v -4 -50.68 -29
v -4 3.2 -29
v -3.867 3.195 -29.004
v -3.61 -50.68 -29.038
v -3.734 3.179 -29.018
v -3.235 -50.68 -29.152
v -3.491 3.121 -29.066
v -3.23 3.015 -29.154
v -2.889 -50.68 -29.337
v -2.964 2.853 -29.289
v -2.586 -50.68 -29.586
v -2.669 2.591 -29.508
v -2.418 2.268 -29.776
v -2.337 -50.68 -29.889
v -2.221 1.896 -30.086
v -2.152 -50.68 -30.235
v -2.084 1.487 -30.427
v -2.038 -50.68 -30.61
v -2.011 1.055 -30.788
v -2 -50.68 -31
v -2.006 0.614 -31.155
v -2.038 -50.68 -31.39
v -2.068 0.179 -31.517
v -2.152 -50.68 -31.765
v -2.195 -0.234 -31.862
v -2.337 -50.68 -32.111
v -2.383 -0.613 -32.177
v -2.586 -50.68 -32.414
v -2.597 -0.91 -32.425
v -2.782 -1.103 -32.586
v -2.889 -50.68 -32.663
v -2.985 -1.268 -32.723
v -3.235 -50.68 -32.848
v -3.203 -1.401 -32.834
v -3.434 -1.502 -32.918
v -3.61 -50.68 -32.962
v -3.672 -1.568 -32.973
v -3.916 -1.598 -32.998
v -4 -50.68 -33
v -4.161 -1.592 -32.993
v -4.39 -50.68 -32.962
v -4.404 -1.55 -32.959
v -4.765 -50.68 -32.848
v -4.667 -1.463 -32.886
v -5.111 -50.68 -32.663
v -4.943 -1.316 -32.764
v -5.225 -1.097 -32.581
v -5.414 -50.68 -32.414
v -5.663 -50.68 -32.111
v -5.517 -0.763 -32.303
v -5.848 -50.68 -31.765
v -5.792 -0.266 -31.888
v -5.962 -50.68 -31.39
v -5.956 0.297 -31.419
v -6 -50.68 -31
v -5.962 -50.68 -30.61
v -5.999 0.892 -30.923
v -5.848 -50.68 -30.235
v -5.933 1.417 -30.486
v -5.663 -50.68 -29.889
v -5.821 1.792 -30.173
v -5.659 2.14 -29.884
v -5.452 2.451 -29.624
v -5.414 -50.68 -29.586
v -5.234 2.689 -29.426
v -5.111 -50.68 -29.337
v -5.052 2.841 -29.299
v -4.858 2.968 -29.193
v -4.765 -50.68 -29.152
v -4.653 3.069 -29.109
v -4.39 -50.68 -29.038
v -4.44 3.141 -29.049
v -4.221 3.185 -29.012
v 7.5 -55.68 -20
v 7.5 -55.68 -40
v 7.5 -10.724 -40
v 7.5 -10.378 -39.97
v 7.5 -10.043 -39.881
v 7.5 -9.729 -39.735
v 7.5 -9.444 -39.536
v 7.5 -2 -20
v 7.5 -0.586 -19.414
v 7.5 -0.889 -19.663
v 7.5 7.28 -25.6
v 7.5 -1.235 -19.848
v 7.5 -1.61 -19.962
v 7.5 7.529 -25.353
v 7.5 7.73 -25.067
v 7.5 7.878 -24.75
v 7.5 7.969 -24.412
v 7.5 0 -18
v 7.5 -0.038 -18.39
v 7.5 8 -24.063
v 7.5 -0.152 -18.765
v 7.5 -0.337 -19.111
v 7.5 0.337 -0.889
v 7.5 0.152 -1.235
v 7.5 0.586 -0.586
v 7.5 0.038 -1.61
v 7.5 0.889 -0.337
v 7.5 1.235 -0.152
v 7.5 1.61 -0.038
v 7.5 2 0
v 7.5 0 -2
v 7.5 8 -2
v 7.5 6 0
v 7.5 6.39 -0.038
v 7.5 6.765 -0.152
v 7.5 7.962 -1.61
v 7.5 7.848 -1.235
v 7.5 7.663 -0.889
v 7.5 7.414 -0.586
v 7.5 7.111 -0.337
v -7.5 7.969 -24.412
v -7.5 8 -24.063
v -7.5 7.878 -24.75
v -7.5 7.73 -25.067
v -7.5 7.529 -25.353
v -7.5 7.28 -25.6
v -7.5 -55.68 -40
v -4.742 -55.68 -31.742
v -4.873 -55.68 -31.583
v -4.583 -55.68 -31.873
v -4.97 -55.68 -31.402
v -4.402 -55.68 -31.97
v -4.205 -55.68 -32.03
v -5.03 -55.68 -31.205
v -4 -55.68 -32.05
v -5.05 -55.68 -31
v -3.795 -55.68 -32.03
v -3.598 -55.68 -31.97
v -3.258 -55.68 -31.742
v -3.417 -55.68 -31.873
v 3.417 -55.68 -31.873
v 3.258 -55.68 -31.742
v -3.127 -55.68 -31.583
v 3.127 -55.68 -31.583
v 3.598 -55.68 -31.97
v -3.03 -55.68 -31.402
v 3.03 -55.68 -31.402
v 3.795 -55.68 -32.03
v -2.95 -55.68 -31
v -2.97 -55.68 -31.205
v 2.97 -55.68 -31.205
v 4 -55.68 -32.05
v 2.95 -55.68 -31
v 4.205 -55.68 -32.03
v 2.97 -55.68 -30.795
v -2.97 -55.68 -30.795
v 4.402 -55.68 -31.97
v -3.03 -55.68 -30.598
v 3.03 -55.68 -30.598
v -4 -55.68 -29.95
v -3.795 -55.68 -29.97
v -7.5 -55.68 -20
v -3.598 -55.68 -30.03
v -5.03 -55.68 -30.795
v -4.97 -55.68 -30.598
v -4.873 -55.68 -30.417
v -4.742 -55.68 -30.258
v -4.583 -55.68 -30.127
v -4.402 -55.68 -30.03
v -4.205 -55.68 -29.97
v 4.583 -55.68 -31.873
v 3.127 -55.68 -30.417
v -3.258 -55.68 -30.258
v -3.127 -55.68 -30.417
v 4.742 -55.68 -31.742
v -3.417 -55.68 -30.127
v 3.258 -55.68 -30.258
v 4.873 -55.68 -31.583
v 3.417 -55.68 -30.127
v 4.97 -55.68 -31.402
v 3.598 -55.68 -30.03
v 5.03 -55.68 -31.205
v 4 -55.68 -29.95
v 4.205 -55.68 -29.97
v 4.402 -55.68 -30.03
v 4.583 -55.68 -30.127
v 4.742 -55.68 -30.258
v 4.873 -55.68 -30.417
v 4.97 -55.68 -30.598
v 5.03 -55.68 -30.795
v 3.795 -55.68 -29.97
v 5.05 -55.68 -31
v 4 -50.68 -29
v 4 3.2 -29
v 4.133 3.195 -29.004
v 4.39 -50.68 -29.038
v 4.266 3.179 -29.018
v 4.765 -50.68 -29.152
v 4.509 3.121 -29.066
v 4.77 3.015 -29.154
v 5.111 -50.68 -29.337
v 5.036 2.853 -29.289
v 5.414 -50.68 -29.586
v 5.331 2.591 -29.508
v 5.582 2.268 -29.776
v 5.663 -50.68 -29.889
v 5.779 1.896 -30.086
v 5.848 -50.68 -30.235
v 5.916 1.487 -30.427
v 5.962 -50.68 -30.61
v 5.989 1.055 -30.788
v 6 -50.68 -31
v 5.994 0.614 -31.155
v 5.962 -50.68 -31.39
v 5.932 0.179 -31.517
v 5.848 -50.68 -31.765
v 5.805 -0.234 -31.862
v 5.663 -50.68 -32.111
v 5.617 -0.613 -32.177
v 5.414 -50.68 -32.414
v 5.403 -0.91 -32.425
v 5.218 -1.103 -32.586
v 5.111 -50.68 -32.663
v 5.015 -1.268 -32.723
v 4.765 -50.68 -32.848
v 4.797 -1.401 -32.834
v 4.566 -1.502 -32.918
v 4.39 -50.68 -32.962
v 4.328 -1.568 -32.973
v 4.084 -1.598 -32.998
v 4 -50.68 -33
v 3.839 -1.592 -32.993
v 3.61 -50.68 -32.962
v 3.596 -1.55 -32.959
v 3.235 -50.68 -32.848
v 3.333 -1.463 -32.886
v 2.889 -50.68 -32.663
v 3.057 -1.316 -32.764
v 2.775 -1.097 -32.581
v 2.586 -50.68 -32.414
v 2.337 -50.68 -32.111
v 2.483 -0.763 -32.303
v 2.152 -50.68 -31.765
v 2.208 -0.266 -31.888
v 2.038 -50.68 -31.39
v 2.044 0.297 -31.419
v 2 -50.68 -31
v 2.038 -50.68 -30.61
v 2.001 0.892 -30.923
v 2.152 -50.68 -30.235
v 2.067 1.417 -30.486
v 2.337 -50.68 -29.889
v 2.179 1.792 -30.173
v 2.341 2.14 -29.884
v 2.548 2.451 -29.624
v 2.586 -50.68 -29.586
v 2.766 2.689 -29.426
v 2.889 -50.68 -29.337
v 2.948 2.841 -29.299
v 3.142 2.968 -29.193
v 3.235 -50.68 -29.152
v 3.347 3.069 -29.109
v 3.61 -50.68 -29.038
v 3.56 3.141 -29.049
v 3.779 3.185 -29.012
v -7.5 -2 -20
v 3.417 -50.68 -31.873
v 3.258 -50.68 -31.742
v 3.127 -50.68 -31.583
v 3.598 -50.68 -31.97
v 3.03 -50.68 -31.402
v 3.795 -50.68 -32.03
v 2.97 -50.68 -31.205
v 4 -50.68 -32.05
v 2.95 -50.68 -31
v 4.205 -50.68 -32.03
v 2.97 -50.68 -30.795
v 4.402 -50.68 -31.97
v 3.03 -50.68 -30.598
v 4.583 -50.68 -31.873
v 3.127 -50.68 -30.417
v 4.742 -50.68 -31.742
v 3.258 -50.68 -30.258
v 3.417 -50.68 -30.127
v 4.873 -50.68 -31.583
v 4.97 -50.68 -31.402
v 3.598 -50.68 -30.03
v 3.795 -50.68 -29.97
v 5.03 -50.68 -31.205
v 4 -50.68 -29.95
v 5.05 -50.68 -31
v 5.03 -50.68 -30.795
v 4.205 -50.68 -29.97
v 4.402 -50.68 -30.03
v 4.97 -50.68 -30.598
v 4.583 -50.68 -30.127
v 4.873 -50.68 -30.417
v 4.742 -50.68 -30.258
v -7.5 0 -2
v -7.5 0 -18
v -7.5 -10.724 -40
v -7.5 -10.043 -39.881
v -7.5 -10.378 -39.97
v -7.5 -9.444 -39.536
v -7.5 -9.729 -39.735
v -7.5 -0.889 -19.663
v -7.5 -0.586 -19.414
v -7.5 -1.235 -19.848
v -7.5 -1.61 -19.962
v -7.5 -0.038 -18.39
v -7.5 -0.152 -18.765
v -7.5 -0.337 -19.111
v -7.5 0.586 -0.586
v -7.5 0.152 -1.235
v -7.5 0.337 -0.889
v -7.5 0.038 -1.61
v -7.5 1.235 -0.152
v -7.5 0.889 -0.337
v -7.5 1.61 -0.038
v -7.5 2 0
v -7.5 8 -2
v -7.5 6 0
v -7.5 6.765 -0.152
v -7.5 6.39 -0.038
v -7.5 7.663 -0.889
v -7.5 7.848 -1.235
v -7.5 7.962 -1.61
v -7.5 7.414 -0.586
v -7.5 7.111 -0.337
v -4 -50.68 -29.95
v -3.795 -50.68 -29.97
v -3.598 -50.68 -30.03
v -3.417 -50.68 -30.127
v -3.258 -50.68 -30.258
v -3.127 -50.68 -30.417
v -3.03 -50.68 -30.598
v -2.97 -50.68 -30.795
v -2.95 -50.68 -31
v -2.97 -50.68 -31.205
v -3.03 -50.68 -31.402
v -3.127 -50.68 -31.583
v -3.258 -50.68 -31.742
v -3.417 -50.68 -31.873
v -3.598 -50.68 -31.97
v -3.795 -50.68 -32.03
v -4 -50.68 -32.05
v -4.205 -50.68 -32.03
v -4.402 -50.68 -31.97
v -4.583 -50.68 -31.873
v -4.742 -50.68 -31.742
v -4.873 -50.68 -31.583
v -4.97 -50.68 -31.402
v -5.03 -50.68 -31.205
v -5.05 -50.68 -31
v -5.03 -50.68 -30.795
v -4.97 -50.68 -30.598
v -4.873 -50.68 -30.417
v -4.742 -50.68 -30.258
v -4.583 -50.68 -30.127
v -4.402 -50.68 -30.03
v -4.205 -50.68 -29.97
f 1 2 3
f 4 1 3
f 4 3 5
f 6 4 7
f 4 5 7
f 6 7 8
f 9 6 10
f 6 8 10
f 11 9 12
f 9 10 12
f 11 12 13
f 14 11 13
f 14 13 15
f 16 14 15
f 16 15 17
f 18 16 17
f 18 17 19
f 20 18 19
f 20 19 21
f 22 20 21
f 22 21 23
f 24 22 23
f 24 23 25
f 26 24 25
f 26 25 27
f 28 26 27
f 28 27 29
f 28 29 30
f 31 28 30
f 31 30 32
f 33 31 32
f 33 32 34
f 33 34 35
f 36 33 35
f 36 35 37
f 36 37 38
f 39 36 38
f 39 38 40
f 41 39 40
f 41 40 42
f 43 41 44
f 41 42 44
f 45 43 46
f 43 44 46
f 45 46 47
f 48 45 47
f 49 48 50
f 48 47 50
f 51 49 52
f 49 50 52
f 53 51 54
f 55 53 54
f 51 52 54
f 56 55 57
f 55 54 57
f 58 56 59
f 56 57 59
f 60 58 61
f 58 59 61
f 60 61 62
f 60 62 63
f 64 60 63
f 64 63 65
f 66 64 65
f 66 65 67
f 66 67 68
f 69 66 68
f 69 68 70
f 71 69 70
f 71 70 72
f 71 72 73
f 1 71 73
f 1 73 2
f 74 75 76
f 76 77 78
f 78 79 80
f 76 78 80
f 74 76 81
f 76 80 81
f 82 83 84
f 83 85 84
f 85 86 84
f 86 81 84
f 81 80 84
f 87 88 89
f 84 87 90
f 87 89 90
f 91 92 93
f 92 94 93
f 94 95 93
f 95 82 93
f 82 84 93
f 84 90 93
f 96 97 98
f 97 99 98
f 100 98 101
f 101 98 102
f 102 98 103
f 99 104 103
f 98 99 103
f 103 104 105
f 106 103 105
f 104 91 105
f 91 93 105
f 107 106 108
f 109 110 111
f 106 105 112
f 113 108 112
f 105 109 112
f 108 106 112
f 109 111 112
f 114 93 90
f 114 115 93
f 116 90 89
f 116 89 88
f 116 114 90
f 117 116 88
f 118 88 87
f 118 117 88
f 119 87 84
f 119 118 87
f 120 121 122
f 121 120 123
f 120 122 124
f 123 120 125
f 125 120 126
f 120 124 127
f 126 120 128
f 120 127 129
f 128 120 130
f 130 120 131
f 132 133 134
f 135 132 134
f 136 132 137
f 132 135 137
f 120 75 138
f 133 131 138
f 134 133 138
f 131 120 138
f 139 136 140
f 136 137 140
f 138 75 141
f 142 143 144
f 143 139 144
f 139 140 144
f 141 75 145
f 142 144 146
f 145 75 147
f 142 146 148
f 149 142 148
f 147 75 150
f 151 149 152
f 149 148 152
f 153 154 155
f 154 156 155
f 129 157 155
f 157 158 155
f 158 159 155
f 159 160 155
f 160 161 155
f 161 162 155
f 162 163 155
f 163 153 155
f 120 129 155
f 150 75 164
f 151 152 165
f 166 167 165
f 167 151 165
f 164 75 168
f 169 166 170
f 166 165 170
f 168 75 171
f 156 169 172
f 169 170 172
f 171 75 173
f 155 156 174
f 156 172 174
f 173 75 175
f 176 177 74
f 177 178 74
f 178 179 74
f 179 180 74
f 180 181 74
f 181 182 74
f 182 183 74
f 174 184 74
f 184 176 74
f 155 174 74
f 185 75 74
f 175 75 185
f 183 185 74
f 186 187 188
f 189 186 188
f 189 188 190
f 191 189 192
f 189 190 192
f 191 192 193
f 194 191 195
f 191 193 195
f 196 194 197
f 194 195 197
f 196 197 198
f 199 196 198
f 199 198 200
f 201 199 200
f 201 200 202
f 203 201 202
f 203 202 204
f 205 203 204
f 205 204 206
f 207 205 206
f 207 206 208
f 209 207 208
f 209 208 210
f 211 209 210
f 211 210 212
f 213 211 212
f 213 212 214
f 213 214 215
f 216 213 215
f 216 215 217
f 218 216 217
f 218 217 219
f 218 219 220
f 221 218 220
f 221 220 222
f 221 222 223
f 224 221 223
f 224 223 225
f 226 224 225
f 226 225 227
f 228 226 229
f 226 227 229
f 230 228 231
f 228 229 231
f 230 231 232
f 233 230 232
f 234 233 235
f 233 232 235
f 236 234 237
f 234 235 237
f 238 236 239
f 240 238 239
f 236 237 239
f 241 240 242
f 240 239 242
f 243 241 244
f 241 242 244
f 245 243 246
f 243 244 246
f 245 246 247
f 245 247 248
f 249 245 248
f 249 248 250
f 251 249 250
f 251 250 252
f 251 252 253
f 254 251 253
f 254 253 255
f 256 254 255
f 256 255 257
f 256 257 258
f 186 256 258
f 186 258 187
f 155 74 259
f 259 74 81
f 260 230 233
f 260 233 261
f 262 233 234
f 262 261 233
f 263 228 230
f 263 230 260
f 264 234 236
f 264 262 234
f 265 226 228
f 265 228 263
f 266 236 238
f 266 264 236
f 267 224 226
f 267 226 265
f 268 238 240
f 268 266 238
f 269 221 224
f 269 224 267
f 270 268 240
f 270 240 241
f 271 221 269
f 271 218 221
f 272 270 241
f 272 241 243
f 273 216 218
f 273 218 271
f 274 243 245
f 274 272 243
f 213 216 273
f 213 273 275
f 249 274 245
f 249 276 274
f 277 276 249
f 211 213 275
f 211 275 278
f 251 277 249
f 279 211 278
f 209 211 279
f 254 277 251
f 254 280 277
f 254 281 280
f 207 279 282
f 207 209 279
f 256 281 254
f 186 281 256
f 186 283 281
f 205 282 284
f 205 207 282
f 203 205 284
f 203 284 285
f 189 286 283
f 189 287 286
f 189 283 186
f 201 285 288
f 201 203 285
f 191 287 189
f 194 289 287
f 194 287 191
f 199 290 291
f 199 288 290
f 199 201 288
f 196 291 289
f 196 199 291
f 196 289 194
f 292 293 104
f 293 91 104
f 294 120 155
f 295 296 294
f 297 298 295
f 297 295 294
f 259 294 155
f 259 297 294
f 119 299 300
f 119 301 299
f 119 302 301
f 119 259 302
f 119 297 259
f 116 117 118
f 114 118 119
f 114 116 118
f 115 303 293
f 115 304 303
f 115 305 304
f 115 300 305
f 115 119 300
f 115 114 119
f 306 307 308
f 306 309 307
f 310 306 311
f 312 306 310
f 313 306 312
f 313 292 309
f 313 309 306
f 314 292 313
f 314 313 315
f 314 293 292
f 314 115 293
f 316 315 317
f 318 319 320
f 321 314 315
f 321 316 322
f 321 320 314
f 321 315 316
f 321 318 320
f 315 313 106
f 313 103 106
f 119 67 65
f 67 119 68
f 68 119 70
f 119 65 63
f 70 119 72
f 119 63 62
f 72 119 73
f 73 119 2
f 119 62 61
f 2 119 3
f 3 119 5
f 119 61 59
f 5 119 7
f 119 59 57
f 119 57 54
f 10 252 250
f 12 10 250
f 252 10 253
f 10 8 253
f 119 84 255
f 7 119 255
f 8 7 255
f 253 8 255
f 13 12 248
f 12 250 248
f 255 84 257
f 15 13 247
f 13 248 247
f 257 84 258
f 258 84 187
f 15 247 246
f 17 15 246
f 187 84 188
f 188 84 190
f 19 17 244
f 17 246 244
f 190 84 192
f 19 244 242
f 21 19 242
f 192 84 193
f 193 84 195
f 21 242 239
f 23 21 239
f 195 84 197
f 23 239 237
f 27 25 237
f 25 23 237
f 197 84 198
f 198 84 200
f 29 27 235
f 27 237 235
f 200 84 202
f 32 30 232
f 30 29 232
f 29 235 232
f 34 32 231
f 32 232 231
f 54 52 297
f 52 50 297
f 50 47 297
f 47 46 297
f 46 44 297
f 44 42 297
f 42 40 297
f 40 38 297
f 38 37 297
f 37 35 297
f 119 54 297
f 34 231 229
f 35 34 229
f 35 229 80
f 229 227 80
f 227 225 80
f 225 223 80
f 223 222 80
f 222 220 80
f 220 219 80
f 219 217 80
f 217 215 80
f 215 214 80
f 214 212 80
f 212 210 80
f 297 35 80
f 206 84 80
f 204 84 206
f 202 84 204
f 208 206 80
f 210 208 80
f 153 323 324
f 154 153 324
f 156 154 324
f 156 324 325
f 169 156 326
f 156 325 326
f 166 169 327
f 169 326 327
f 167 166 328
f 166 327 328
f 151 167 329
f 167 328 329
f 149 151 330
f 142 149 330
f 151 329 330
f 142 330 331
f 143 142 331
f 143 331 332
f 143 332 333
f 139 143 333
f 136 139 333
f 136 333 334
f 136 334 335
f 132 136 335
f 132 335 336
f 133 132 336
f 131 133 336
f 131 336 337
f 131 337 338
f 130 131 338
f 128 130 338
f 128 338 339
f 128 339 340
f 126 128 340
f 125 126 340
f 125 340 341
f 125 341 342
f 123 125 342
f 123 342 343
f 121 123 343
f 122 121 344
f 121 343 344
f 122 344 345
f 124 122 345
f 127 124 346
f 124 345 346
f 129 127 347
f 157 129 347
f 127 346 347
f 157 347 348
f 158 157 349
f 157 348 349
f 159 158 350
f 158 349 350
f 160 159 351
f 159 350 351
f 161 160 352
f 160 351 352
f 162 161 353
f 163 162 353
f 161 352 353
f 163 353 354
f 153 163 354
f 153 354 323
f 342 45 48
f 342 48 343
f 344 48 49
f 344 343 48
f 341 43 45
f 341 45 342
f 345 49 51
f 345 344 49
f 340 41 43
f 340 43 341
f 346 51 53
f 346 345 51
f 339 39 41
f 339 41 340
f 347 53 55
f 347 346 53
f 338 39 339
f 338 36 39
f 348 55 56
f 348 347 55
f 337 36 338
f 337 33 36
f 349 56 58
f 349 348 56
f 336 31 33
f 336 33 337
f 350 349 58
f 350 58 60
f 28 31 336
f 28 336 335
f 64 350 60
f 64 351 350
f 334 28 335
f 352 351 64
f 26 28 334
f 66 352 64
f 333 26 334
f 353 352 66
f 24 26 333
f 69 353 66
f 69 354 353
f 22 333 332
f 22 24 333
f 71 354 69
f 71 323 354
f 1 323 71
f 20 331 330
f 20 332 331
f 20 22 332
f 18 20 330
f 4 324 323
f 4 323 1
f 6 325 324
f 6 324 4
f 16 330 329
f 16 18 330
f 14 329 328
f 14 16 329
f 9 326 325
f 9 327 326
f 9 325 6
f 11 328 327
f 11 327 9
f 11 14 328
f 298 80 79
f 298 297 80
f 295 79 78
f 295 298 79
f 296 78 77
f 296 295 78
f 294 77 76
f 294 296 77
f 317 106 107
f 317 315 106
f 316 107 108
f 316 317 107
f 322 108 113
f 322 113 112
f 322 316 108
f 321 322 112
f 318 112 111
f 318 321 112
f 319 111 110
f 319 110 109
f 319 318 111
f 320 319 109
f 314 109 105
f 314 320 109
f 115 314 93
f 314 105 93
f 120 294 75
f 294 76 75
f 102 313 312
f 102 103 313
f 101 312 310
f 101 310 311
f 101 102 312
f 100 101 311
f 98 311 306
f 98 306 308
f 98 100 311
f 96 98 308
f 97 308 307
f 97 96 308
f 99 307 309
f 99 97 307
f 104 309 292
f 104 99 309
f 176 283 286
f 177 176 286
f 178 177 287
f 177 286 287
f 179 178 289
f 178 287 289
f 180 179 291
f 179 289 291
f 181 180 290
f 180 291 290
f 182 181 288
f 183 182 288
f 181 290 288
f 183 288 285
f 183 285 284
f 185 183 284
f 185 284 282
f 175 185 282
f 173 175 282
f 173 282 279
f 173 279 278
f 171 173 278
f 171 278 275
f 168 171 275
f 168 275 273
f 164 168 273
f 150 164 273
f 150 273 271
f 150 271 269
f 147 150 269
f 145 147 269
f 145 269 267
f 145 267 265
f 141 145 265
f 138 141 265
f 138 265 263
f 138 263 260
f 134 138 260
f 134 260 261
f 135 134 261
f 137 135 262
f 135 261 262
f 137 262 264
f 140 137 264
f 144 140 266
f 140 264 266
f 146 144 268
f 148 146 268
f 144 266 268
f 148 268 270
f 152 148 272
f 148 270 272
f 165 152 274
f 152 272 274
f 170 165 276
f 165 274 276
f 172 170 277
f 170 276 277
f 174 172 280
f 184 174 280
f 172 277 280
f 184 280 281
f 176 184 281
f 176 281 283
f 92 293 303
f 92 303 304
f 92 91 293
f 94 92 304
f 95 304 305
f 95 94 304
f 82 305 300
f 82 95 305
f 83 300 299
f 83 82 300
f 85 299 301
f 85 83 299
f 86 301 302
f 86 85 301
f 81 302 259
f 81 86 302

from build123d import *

# Parameters (mm, degrees)
BOSS_EXTRUDE1_DEPTH = 7.5
SKETCH2_R           = 2
CUT_EXTRUDE1_DEPTH  = 58.68
CUT_EXTRUDE2_REACH  = 77.574
SKETCH3_R           = 1.05
FILLET1_R           = 2


with BuildPart() as part:
    # Sketch1 → Boss-Extrude1 (new, symmetric)
    with BuildSketch(Plane(origin=(0, 0, 0), x_dir=(0, 0, -1), z_dir=(1, 0, 0))):
        Polygon((0, 0), (0, 8), (25, 8), (40, -10), (40, -55.68), (20, -55.68), (20, 0), align=None)
    extrude(amount=BOSS_EXTRUDE1_DEPTH, both=True)

    # Sketch2 → Cut-Extrude1 (cut)
    with BuildSketch(Plane(origin=(0, 8, 0), x_dir=(1, 0, 0), z_dir=(0, 1, 0))):
        with Locations(Location((-4, 31, 0), (0, 0, 270))):
            Circle(SKETCH2_R)
        with Locations(Location((4, 31, 0), (0, 0, 270))):
            Circle(SKETCH2_R)
    extrude(amount=-CUT_EXTRUDE1_DEPTH, mode=Mode.SUBTRACT)

    # Sketch3 → Cut-Extrude2 (cut, up to next)
    with BuildSketch(Plane(origin=(0, 8, 0), x_dir=(1, 0, 0), z_dir=(0, 1, 0)), mode=Mode.PRIVATE) as cut_extrude2_sk1:
        with Locations(Location((-4, 31, 0), (0, 0, 270))):
            Circle(SKETCH3_R)
    cut_extrude2_tool1 = extrude(cut_extrude2_sk1.sketch, amount=-CUT_EXTRUDE2_REACH, mode=Mode.PRIVATE) & part.part
    # Sketch3 → Cut-Extrude2 (cut, up to next)
    with BuildSketch(Plane(origin=(0, 8, 0), x_dir=(1, 0, 0), z_dir=(0, 1, 0)), mode=Mode.PRIVATE) as cut_extrude2_sk2:
        with Locations(Location((4, 31, 0), (0, 0, 270))):
            Circle(SKETCH3_R)
    cut_extrude2_tool2 = extrude(cut_extrude2_sk2.sketch, amount=-CUT_EXTRUDE2_REACH, mode=Mode.PRIVATE) & part.part
    add(cut_extrude2_tool1.solids().sort_by_distance((-4, 8, -31))[0], mode=Mode.SUBTRACT)
    add(cut_extrude2_tool2.solids().sort_by_distance((4, 8, -31))[0], mode=Mode.SUBTRACT)

    # Fillet1
    fillet1_edges = [part.edges().sort_by_distance(p)[0] for p in [
        (0, 0, 0),
        (0, 8, 0),
        (0, 8, -25),
        (0, -10, -40),
        (0, 0, -20),
    ]]
    fillet(fillet1_edges, radius=FILLET1_R)


solid = part.part
